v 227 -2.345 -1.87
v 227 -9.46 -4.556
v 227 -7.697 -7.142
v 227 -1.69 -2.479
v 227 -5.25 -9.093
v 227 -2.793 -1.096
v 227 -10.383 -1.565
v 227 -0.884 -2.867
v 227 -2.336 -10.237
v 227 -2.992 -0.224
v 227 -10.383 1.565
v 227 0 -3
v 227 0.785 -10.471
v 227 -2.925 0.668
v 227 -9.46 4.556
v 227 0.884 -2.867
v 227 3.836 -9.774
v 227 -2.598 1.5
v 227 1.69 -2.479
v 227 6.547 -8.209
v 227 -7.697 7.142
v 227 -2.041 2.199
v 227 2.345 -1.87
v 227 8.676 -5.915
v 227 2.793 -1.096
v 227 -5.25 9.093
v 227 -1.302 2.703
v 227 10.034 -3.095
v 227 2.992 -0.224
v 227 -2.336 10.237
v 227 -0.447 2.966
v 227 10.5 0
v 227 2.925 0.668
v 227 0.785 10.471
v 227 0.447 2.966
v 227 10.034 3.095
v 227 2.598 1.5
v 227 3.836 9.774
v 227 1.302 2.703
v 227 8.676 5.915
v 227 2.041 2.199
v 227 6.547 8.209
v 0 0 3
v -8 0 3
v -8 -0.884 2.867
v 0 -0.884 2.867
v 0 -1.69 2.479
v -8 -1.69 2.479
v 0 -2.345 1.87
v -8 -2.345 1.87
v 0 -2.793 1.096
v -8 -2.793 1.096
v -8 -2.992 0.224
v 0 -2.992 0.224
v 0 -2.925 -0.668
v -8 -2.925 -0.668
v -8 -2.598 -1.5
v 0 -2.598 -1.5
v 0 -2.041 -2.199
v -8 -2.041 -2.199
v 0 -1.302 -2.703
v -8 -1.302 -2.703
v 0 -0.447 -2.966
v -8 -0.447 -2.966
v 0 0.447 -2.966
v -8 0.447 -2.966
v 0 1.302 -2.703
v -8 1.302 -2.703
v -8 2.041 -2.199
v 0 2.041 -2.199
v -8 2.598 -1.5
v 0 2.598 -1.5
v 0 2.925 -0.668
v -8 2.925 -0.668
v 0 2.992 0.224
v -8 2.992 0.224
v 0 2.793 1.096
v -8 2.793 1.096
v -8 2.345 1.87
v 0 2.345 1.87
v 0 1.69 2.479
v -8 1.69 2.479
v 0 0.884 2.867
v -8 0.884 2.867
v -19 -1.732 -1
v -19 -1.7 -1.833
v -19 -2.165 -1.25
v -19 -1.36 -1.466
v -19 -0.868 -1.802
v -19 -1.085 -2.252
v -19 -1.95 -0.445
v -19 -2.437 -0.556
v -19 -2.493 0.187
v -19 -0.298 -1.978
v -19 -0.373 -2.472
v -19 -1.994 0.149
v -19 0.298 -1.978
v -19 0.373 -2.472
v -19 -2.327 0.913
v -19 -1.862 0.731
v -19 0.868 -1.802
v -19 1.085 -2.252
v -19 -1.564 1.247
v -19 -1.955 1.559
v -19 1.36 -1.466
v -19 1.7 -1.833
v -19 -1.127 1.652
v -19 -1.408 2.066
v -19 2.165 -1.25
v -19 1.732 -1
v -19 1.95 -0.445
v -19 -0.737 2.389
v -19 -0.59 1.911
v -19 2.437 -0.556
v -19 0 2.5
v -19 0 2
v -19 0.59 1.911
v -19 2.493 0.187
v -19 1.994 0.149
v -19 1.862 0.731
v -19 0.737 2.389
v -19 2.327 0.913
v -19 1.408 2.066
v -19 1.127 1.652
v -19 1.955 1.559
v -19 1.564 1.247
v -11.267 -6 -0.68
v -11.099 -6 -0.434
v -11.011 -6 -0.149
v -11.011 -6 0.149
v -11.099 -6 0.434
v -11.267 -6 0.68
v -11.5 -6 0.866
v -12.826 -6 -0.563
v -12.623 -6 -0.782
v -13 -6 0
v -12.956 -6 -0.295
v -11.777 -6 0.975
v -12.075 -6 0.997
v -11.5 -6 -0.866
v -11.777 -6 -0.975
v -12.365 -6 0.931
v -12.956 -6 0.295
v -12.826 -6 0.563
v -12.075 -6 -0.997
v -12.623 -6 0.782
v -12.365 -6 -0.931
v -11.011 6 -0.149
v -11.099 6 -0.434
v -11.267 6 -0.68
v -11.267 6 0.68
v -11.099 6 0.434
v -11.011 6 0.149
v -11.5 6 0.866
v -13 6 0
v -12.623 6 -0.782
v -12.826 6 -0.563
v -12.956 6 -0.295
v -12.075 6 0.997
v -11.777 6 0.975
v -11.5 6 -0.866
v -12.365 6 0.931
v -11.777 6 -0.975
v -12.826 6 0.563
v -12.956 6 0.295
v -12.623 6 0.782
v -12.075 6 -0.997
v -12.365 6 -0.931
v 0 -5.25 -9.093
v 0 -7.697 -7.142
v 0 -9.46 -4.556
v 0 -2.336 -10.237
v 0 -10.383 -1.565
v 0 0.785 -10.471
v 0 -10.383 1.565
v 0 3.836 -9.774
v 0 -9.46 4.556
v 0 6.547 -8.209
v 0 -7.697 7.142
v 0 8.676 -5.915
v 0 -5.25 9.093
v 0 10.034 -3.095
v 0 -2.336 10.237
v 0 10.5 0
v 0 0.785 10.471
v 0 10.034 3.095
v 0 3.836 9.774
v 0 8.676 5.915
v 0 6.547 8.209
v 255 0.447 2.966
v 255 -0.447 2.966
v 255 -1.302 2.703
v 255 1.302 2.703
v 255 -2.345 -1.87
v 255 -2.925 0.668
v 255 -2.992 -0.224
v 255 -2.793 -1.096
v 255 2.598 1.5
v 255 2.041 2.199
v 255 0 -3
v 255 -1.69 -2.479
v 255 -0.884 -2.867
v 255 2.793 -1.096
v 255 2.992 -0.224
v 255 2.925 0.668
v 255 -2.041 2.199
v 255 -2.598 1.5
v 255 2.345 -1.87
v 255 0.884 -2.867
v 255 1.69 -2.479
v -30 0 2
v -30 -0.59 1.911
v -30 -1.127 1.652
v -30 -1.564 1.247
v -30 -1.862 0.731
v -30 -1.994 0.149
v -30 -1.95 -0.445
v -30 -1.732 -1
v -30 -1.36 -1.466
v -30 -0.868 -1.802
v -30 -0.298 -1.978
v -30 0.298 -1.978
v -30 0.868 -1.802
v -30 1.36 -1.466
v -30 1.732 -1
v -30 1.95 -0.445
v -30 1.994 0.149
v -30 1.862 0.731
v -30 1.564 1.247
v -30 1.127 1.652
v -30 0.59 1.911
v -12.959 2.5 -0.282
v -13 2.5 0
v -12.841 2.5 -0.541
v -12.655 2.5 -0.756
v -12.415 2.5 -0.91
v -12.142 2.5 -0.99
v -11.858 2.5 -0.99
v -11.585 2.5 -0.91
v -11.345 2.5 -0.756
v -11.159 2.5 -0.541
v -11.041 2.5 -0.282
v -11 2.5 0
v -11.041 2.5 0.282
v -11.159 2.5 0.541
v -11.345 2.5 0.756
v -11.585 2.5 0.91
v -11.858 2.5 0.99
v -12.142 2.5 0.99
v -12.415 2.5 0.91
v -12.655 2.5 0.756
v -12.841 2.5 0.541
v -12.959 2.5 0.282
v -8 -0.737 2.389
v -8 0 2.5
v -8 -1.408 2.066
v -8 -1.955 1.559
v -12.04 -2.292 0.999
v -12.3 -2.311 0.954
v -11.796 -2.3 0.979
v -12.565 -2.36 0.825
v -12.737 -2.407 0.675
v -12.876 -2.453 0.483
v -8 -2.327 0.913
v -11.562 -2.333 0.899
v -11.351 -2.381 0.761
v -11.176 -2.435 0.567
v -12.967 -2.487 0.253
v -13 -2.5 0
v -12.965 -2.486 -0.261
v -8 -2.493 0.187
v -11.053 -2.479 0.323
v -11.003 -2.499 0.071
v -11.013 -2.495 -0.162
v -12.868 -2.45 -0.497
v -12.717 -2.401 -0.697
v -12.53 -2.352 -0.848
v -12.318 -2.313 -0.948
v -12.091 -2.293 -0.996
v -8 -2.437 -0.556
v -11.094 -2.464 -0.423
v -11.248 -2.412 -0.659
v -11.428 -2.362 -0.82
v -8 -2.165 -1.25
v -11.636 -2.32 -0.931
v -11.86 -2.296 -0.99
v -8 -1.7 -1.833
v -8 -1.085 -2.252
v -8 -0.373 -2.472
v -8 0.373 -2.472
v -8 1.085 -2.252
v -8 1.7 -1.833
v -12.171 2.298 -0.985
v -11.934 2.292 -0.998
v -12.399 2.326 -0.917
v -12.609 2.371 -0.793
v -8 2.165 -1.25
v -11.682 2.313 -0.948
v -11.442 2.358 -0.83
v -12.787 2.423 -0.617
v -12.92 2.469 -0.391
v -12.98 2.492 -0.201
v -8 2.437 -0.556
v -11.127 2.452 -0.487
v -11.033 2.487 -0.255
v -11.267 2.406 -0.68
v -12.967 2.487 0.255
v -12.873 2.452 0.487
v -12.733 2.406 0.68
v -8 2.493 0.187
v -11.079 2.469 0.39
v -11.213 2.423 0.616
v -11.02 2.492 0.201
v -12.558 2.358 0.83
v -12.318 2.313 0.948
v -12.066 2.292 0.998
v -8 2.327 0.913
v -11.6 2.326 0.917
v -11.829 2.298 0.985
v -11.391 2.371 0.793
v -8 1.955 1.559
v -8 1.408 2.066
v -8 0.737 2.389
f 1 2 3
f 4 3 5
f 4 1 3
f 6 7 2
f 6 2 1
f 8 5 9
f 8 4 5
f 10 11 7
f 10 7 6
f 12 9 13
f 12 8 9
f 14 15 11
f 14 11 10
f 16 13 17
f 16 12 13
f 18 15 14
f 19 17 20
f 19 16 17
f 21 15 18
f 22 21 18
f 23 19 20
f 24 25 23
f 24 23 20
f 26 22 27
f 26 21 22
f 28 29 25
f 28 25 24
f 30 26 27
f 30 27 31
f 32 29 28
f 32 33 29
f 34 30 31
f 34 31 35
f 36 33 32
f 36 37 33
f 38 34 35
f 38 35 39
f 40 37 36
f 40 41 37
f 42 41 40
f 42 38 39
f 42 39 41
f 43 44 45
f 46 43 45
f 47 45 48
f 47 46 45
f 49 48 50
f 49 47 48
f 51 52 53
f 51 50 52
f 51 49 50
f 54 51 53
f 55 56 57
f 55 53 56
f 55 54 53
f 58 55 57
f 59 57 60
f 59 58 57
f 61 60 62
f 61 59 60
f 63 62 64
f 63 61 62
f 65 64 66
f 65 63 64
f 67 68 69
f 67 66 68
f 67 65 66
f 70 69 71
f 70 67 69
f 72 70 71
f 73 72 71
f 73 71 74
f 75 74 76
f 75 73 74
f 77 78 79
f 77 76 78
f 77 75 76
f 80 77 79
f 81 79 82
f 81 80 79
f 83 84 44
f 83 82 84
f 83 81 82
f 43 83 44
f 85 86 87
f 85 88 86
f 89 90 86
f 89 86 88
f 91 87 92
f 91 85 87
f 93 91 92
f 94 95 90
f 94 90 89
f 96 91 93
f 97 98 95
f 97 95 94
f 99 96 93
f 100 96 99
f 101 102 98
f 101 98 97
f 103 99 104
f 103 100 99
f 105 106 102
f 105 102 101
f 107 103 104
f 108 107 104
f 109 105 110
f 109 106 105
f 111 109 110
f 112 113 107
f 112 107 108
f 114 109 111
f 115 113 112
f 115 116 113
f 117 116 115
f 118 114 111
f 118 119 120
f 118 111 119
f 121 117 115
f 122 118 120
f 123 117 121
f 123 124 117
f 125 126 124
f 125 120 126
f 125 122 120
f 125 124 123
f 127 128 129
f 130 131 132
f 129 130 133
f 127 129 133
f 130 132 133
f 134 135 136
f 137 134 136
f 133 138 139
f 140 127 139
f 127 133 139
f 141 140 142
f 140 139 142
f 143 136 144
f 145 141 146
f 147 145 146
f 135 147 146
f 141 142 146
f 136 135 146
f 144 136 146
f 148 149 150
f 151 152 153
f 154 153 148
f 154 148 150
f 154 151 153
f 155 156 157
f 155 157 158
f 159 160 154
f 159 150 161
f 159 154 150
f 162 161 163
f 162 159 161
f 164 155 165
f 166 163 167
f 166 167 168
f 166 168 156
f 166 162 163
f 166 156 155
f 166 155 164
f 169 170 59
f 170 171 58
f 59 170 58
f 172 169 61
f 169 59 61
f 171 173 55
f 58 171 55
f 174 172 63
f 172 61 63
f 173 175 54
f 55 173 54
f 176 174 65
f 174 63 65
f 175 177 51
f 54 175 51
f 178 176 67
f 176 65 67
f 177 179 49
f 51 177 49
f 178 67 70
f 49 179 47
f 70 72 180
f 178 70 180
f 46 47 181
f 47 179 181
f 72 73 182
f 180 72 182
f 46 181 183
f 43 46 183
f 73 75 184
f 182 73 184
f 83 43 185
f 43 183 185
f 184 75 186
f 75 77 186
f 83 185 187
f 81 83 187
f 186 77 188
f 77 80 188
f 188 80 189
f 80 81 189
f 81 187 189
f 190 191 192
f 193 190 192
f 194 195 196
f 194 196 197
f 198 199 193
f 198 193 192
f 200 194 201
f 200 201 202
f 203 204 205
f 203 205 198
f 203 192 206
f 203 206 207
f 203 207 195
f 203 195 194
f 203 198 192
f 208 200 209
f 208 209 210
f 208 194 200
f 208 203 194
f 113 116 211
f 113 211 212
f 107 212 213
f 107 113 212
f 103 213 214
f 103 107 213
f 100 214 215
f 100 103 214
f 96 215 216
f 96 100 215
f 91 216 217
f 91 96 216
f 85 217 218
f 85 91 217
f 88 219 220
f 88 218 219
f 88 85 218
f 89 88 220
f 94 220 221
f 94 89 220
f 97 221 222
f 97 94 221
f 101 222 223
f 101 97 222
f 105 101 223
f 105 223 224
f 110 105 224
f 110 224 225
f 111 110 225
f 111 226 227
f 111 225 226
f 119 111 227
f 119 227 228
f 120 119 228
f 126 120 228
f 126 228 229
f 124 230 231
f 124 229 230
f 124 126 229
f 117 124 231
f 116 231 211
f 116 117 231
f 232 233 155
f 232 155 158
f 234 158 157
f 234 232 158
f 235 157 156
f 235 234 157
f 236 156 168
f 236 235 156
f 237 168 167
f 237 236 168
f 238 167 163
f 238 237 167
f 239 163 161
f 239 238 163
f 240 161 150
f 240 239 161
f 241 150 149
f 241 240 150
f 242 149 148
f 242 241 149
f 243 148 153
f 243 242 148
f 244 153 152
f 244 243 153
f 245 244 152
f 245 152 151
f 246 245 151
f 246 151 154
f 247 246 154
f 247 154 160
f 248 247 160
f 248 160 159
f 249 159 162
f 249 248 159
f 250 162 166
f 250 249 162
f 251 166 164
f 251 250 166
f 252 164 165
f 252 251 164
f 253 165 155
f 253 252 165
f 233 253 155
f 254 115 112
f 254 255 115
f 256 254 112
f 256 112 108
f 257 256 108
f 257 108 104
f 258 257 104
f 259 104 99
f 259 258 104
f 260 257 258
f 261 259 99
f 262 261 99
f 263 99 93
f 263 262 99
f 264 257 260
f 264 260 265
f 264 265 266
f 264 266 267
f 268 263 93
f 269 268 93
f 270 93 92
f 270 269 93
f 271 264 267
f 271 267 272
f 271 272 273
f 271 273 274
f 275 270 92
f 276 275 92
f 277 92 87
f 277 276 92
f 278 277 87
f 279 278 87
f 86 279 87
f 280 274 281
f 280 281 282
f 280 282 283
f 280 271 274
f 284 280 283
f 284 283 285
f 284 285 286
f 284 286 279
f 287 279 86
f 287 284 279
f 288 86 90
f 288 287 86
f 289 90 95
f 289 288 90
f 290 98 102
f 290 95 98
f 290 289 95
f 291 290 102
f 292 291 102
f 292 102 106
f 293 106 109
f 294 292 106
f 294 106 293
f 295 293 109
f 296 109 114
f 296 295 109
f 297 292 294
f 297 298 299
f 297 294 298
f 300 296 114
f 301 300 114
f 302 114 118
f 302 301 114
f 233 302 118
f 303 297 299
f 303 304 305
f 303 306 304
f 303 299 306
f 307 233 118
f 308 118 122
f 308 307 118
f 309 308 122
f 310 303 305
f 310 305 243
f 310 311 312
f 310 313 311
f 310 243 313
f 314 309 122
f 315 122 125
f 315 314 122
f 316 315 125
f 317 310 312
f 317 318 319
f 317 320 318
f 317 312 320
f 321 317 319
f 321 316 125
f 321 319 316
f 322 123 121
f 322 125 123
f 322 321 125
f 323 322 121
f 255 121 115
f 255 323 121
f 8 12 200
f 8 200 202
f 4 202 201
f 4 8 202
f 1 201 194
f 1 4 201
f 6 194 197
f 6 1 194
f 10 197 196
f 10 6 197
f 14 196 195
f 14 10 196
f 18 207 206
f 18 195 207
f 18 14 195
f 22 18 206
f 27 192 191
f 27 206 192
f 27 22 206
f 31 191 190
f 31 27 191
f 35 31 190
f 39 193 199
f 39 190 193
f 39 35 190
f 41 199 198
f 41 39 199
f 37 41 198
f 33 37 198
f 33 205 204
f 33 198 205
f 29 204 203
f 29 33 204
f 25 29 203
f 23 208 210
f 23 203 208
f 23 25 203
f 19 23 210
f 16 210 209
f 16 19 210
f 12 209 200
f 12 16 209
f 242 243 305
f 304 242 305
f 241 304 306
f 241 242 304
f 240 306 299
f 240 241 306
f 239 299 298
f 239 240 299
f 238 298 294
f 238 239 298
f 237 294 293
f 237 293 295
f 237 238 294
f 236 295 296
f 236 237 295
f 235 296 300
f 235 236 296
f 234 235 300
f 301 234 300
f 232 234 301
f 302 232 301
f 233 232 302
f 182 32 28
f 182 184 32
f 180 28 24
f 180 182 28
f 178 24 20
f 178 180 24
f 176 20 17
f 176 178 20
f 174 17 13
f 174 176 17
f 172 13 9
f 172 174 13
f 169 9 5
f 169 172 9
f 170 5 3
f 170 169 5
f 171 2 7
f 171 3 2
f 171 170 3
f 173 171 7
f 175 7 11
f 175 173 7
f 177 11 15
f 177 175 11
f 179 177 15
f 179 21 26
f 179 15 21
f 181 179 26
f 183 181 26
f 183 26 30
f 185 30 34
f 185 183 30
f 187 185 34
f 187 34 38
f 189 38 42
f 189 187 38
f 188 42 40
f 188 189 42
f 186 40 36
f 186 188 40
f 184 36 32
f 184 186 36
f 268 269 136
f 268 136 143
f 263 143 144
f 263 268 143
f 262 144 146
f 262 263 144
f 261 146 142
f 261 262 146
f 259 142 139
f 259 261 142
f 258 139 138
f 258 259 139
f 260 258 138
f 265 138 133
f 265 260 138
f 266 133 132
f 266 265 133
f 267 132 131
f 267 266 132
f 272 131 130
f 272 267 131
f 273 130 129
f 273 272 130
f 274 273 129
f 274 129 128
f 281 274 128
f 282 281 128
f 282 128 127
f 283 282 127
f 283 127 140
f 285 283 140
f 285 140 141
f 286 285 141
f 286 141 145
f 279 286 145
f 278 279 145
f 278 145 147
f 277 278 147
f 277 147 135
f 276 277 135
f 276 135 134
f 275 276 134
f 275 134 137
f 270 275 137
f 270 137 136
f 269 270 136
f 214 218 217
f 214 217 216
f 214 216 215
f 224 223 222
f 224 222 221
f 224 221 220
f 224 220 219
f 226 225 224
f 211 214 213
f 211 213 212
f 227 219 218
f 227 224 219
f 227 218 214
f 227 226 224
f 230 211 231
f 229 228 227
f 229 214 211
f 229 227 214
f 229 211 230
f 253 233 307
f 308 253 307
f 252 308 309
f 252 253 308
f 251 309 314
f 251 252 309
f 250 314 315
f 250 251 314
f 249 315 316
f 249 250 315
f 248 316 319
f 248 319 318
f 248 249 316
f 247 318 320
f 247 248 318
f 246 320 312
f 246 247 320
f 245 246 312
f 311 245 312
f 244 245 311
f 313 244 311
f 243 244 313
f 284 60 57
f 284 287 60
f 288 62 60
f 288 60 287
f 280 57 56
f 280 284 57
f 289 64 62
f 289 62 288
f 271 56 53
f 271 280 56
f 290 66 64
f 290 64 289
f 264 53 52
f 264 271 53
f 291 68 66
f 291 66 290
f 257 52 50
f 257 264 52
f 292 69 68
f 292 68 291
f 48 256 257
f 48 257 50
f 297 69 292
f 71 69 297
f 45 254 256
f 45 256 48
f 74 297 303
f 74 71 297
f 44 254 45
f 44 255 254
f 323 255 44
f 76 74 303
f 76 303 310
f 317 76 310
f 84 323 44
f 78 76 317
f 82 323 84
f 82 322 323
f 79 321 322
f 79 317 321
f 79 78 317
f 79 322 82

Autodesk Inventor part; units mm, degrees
ref_plane "YZ Plane" through (0, 0, 0) normal (1, 0, 0) x (0, 1, 0)
ref_plane "XY Plane" through (0, 0, 0) normal (0, 0, 1) x (1, 0, 0)
sketch "Sketch1" plane through (0, 0, 0) normal (1, 0, 0) x (0, 1, 0)
  circle A0 centre (0, 0) radius 10.5
  dimension "d0" = 21
extrude "Extrusion1" add sketch "Sketch1" along normal blind 227
sketch "Sketch2" plane through (227, 0, 0) normal (1, 0, 0) x (0, 0, -1)
  circle A0 centre (0, 0) radius 3
  dimension "d3" = 6
sketch "Sketch3" plane through (0, 0, 0) normal (-1, 0, 0) x (0, 0, 1)
  circle A0 centre (0, 0) radius 3
  dimension "d4" = 6
extrude "Extrusion2" add sketch "Sketch3" along normal blind 8
extrude "Extrusion3" add sketch "Sketch2" along normal blind 28
sketch "Sketch4" plane through (-8, 0, 0) normal (-1, 0, 0) x (0, 0, 1)
  circle A0 centre (0, 0) radius 2.5
  dimension "d9" = 5
extrude "Extrusion4" add sketch "Sketch4" along normal blind 11
ref_plane "Work Plane1" through (-8, 2.5, 0) normal (0, 1, 0) x (-1, 0, 0)
sketch "Sketch5" plane through (-8, 2.5, 0) normal (0, 1, 0) x (-1, 0, 0)
  circle A0 centre (4, 0) radius 1
  line L0 (0, -3) -> (0, 3) projected
  point P0 (-8, 0)
  dimension "d12" = 2
  dimension "d13" = 4
extrude "Extrusion5" add sketch "Sketch5" along normal blind 3.5 and the other way blind 8.5
sketch "Sketch6" plane through (-19, 0, 0) normal (-1, 0, 0) x (0, 0, 1)
  circle A0 centre (0, 0) radius 2
  dimension "d16" = 4
extrude "Extrusion6" add sketch "Sketch6" along normal blind 11
properties part number "RouleauFriction"
